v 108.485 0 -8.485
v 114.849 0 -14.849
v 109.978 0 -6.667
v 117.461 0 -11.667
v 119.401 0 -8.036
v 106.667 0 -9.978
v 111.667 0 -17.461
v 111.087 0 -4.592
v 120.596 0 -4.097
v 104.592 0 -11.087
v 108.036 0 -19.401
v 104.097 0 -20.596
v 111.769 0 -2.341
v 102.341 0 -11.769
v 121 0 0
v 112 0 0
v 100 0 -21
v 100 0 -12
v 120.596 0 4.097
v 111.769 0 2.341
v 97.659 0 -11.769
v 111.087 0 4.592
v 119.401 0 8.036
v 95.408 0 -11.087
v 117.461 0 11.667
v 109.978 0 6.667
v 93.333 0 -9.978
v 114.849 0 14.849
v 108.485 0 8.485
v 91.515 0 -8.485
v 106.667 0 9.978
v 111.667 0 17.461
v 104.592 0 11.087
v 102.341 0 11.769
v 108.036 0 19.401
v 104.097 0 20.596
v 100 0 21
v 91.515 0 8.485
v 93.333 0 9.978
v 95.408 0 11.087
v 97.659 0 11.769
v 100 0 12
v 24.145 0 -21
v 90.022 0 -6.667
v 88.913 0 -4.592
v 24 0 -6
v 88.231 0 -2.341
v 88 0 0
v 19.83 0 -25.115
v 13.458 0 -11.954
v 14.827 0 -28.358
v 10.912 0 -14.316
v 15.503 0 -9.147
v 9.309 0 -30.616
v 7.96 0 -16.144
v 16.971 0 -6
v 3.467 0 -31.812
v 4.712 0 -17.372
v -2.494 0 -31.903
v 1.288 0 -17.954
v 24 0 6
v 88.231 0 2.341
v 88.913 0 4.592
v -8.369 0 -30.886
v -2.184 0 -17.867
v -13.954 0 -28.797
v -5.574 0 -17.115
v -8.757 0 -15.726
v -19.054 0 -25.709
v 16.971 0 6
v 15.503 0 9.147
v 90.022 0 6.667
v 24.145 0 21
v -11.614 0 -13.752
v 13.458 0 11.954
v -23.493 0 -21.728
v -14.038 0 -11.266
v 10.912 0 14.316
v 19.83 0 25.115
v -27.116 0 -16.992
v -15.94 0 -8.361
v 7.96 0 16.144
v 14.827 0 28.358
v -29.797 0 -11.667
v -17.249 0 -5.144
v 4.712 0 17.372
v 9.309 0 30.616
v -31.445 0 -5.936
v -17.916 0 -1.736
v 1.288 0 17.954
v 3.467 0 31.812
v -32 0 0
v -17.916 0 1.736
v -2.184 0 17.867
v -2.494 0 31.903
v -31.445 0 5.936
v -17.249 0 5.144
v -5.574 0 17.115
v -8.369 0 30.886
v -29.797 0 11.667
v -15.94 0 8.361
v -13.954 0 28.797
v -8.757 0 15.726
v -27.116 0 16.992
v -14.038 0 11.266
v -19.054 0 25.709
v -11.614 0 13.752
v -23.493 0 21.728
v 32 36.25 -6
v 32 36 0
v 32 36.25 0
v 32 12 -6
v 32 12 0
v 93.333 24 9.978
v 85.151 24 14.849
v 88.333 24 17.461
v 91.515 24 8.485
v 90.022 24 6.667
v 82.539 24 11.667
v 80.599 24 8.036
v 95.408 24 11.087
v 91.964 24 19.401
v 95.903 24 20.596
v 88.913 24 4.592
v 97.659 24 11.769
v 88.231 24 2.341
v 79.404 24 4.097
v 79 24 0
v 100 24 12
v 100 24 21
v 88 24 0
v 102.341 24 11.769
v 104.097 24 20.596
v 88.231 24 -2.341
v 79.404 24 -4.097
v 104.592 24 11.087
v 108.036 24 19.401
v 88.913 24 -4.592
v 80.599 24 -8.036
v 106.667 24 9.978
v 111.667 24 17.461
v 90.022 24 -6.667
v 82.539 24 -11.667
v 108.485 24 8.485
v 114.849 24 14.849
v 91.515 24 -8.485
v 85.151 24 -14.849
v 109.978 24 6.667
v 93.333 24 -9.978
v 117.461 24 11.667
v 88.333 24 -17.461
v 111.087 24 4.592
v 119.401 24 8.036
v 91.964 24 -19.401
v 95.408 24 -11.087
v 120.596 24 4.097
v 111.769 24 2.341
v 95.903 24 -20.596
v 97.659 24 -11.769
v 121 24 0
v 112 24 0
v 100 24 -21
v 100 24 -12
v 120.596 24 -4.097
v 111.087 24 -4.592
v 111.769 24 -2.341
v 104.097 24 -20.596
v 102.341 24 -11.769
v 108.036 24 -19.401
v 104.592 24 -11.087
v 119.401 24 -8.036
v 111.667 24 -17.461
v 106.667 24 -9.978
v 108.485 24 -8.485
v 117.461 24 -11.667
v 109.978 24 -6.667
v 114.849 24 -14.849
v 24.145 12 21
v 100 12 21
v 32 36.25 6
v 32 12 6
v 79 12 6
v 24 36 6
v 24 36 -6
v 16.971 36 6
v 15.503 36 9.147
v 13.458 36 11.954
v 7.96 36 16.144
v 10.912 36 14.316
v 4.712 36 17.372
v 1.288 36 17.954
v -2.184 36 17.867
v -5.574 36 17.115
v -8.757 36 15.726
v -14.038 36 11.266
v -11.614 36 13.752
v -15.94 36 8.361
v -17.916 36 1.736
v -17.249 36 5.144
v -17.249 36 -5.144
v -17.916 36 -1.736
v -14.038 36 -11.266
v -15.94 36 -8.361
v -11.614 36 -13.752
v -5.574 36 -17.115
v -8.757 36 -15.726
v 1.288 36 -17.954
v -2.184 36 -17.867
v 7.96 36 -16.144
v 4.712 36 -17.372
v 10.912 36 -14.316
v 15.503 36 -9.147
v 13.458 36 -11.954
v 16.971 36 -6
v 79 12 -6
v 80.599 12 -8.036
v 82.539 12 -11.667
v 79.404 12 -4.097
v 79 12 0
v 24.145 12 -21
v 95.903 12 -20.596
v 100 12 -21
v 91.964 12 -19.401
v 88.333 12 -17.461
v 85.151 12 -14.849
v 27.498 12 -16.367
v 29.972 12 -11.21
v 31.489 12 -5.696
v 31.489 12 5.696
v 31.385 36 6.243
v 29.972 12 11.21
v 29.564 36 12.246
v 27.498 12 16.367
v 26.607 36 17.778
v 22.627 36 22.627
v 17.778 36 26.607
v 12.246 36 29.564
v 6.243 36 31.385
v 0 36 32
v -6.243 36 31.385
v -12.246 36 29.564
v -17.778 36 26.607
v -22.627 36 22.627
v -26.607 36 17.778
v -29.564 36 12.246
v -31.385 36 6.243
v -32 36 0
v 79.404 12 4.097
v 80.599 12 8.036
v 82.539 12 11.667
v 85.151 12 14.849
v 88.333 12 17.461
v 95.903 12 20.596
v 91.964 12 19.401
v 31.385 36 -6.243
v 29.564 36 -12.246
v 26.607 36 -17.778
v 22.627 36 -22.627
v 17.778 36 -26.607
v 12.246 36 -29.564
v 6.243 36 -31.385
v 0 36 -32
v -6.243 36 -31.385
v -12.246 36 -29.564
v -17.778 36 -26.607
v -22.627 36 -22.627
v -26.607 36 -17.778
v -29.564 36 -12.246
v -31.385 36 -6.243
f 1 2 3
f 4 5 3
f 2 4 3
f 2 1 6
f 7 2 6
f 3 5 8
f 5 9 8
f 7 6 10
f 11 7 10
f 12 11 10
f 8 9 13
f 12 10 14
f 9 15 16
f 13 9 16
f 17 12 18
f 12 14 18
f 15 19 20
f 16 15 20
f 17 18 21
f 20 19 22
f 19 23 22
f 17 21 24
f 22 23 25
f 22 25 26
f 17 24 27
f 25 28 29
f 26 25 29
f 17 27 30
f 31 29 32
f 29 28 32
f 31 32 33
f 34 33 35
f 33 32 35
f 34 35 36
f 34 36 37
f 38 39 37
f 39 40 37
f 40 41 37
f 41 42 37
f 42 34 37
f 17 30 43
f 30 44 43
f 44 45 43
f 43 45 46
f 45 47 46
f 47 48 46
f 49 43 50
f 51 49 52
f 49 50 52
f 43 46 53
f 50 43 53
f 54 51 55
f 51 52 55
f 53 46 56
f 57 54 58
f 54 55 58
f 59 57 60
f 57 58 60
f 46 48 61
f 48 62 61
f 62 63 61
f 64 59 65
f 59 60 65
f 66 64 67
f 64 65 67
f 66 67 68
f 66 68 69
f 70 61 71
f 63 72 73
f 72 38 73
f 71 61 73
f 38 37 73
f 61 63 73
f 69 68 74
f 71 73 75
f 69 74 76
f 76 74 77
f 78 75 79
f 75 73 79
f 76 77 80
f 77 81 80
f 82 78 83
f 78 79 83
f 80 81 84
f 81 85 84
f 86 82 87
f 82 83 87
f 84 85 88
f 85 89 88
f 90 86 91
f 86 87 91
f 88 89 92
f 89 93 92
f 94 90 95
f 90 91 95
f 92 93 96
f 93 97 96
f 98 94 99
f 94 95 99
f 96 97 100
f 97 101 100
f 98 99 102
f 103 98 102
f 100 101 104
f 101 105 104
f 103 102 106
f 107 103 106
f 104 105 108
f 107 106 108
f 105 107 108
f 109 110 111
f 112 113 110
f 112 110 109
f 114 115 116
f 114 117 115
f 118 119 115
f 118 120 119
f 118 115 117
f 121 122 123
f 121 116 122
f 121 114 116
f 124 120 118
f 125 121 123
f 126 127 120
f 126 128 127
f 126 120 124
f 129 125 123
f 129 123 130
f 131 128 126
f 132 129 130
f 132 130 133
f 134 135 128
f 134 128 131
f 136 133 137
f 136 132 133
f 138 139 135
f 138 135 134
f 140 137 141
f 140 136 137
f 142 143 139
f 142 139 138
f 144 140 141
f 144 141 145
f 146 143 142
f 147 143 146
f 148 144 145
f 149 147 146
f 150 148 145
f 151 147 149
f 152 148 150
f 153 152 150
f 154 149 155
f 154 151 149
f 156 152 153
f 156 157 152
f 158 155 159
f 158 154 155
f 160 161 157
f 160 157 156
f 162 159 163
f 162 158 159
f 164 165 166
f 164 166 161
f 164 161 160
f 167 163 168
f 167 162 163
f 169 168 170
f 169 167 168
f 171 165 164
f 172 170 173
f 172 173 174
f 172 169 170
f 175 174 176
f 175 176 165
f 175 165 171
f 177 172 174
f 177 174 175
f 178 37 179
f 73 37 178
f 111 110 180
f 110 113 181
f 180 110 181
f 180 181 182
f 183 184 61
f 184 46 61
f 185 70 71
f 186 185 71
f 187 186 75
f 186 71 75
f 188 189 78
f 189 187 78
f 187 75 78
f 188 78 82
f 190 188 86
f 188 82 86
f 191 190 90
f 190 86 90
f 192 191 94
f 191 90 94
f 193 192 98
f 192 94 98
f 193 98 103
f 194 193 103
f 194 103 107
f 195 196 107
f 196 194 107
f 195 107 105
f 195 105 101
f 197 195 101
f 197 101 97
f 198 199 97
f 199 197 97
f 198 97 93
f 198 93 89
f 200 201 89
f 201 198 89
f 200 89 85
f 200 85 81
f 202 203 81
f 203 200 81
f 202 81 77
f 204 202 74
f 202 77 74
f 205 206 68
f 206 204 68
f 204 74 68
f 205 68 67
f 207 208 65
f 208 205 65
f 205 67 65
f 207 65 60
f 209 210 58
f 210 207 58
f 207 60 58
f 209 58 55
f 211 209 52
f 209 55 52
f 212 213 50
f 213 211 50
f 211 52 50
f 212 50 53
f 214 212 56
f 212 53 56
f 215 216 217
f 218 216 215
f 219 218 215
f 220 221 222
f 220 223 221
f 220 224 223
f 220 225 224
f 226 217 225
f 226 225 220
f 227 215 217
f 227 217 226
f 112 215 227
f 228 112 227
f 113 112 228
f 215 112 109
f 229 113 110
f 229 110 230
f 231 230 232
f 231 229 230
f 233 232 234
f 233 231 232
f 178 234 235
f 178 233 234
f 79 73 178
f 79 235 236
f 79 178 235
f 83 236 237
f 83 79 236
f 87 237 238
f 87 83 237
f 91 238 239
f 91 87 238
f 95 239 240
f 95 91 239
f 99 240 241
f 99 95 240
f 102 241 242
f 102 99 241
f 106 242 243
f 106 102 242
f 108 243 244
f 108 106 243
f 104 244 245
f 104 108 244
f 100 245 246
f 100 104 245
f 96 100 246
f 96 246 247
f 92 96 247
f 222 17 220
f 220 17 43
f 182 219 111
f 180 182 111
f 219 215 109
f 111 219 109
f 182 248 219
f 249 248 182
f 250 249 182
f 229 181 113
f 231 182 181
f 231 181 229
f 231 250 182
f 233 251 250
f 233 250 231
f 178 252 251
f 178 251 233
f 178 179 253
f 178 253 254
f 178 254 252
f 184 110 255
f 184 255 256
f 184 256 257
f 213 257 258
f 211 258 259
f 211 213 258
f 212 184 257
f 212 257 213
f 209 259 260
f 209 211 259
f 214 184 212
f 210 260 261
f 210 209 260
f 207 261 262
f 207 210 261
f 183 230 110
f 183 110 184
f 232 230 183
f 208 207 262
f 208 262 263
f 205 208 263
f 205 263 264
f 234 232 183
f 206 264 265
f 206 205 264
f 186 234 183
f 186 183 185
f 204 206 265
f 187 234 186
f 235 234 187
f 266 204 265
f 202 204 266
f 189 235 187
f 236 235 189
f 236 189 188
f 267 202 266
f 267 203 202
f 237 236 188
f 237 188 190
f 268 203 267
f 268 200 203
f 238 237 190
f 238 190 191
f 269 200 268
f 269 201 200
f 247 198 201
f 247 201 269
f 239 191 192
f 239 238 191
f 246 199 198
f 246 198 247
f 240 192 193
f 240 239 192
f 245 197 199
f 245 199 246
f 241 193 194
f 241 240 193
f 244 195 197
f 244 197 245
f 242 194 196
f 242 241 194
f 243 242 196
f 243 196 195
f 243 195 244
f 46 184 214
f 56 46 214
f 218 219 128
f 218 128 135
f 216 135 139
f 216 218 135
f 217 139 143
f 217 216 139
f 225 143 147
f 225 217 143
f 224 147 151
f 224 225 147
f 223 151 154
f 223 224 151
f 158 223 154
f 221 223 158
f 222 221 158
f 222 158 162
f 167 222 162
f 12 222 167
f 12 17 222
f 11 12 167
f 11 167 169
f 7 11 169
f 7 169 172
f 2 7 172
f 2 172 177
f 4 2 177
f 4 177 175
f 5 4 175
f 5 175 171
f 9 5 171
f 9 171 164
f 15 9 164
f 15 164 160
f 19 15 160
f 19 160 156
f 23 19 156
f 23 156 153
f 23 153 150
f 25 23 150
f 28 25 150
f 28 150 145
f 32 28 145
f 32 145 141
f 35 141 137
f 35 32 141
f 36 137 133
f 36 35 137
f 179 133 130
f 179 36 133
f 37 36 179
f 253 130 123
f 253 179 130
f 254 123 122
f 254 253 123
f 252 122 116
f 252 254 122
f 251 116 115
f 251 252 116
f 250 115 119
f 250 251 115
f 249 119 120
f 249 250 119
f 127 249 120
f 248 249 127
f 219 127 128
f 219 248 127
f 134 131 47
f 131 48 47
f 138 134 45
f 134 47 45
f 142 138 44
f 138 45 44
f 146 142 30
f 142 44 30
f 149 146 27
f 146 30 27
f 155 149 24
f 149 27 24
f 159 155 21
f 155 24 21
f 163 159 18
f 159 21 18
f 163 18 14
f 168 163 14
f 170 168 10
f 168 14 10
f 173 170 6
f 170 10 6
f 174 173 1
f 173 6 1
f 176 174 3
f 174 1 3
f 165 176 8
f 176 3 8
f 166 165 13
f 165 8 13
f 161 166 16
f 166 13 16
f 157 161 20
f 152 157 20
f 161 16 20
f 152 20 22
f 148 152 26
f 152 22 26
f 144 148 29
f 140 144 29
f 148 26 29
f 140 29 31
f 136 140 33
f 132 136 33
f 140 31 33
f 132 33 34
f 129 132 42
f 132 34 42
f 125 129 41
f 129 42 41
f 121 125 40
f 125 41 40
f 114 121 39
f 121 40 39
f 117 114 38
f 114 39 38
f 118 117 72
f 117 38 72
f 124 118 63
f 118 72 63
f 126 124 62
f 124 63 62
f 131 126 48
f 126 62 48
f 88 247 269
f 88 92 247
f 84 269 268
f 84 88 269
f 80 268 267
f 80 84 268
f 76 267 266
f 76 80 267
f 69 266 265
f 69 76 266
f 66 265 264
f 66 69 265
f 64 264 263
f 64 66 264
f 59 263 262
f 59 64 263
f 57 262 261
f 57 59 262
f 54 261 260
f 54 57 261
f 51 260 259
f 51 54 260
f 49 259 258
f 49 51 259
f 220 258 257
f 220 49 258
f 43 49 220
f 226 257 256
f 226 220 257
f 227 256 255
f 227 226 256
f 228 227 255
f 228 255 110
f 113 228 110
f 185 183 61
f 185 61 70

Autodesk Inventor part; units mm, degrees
ref_plane "YZ Plane" through (0, 0, 0) normal (1, 0, 0) x (0, 1, 0)
ref_plane "XZ Plane" through (0, 0, 0) normal (0, 1, 0) x (-1, 0, 0)
ref_plane "XY Plane" through (0, 0, 0) normal (0, 0, 1) x (1, 0, 0)
sketch "Sketch1" plane through (0, 0, 0) normal (0, 1, 0) x (-1, 0, 0)
  arc A0 (-16.9706, -6) -> (-16.9706, 6) centre (0, 0) ccw
  circle A1 centre (0, 0) radius 32
  line L0 (-24, 0) -> (-24, 6)
  line L1 (-24, 0) -> (-24, -6)
  line L2 (-24, 6) -> (-16.9706, 6)
  line L3 (-24, -6) -> (-16.9706, -6)
  circle A2 centre (-100, 0) radius 12
  circle A3 centre (-100, 0) radius 21
  dimension "d0" = 36
  dimension "d1" = 64
  dimension "d3" = 6
  dimension "d4" = 6
  dimension "d6" = 24
  dimension "d7" = 42
extrude "Extrusion1" add sketch "Sketch1" along normal blind 36
sketch "Sketch2" plane through (100, 36, 0) normal (0, 1, 0) x (1, 0, 0)
  circle A0 centre (0, 0) radius 12 projected
  circle A1 centre (0, 0) radius 21
  point P0 (-100, 0)
  dimension "d10" = 42
extrude "Extrusion2" cut sketch "Sketch2" against normal blind 12
sketch "Sketch3" plane through (0, 0, 0) normal (0, 1, 0) x (-1, 0, 0)
  circle A0 centre (-100, 0) radius 21 projected
  line L0 (-100, -21) -> (-24.1454, -21)
  circle A1 centre (0, 0) radius 32 projected
  line L1 (-100, 21) -> (-24.1454, 21)
  arc A2 (-100, -21) -> (-100, 21) centre (-100, 0) ccw
  circle A3 centre (0, 0) radius 30.971
  circle A4 centre (0, 0) radius 32
  circle A5 centre (-100, 0) radius 21
  dimension "d14" = 64
extrude "Extrusion3" add sketch "Sketch3" along normal blind 12 contours A0 L1 A1 L0
sketch "Sketch4" plane through (0, 12, 0) normal (0, 1, 0) x (1, 0, 0)
  arc A0 (24.1454, -21) -> (24.1454, 21) centre (0, 0) ccw projected
  line L0 (32, 0) -> (32, -6)
  line L1 (32, 0) -> (32, 6)
  arc A1 (100, 21) -> (100, -21) centre (100, 0) ccw projected
  line L2 (79, 0) -> (79, 6)
  line L3 (79, 0) -> (79, -6)
  line L4 (32, 6) -> (79, 6)
  line L5 (32, -6) -> (79, -6)
  dimension "d17" = 6
  dimension "d18" = 6
  dimension "d19" = 6
  dimension "d20" = 6
extrude "Extrusion4" add sketch "Sketch4" along normal blind 24.25
sketch "Sketch5" plane through (79, 12, -6) normal (0, 0, -1) x (-1, 0, 0)
  line L0 (0, 0) -> (0, 24.25) projected
  line L1 (0, 0) -> (47, 24.25)
  line L2 (47, 24.25) -> (0, 24.25)
  line L3 (0, 0) -> (-21, 0) projected
  line L4 (0, 24.25) -> (0, 0)
  point P0 (79, -12)
extrude "Extrusion5" cut sketch "Sketch5" against normal blind 24.25
properties part number "6 -  Part 4"
